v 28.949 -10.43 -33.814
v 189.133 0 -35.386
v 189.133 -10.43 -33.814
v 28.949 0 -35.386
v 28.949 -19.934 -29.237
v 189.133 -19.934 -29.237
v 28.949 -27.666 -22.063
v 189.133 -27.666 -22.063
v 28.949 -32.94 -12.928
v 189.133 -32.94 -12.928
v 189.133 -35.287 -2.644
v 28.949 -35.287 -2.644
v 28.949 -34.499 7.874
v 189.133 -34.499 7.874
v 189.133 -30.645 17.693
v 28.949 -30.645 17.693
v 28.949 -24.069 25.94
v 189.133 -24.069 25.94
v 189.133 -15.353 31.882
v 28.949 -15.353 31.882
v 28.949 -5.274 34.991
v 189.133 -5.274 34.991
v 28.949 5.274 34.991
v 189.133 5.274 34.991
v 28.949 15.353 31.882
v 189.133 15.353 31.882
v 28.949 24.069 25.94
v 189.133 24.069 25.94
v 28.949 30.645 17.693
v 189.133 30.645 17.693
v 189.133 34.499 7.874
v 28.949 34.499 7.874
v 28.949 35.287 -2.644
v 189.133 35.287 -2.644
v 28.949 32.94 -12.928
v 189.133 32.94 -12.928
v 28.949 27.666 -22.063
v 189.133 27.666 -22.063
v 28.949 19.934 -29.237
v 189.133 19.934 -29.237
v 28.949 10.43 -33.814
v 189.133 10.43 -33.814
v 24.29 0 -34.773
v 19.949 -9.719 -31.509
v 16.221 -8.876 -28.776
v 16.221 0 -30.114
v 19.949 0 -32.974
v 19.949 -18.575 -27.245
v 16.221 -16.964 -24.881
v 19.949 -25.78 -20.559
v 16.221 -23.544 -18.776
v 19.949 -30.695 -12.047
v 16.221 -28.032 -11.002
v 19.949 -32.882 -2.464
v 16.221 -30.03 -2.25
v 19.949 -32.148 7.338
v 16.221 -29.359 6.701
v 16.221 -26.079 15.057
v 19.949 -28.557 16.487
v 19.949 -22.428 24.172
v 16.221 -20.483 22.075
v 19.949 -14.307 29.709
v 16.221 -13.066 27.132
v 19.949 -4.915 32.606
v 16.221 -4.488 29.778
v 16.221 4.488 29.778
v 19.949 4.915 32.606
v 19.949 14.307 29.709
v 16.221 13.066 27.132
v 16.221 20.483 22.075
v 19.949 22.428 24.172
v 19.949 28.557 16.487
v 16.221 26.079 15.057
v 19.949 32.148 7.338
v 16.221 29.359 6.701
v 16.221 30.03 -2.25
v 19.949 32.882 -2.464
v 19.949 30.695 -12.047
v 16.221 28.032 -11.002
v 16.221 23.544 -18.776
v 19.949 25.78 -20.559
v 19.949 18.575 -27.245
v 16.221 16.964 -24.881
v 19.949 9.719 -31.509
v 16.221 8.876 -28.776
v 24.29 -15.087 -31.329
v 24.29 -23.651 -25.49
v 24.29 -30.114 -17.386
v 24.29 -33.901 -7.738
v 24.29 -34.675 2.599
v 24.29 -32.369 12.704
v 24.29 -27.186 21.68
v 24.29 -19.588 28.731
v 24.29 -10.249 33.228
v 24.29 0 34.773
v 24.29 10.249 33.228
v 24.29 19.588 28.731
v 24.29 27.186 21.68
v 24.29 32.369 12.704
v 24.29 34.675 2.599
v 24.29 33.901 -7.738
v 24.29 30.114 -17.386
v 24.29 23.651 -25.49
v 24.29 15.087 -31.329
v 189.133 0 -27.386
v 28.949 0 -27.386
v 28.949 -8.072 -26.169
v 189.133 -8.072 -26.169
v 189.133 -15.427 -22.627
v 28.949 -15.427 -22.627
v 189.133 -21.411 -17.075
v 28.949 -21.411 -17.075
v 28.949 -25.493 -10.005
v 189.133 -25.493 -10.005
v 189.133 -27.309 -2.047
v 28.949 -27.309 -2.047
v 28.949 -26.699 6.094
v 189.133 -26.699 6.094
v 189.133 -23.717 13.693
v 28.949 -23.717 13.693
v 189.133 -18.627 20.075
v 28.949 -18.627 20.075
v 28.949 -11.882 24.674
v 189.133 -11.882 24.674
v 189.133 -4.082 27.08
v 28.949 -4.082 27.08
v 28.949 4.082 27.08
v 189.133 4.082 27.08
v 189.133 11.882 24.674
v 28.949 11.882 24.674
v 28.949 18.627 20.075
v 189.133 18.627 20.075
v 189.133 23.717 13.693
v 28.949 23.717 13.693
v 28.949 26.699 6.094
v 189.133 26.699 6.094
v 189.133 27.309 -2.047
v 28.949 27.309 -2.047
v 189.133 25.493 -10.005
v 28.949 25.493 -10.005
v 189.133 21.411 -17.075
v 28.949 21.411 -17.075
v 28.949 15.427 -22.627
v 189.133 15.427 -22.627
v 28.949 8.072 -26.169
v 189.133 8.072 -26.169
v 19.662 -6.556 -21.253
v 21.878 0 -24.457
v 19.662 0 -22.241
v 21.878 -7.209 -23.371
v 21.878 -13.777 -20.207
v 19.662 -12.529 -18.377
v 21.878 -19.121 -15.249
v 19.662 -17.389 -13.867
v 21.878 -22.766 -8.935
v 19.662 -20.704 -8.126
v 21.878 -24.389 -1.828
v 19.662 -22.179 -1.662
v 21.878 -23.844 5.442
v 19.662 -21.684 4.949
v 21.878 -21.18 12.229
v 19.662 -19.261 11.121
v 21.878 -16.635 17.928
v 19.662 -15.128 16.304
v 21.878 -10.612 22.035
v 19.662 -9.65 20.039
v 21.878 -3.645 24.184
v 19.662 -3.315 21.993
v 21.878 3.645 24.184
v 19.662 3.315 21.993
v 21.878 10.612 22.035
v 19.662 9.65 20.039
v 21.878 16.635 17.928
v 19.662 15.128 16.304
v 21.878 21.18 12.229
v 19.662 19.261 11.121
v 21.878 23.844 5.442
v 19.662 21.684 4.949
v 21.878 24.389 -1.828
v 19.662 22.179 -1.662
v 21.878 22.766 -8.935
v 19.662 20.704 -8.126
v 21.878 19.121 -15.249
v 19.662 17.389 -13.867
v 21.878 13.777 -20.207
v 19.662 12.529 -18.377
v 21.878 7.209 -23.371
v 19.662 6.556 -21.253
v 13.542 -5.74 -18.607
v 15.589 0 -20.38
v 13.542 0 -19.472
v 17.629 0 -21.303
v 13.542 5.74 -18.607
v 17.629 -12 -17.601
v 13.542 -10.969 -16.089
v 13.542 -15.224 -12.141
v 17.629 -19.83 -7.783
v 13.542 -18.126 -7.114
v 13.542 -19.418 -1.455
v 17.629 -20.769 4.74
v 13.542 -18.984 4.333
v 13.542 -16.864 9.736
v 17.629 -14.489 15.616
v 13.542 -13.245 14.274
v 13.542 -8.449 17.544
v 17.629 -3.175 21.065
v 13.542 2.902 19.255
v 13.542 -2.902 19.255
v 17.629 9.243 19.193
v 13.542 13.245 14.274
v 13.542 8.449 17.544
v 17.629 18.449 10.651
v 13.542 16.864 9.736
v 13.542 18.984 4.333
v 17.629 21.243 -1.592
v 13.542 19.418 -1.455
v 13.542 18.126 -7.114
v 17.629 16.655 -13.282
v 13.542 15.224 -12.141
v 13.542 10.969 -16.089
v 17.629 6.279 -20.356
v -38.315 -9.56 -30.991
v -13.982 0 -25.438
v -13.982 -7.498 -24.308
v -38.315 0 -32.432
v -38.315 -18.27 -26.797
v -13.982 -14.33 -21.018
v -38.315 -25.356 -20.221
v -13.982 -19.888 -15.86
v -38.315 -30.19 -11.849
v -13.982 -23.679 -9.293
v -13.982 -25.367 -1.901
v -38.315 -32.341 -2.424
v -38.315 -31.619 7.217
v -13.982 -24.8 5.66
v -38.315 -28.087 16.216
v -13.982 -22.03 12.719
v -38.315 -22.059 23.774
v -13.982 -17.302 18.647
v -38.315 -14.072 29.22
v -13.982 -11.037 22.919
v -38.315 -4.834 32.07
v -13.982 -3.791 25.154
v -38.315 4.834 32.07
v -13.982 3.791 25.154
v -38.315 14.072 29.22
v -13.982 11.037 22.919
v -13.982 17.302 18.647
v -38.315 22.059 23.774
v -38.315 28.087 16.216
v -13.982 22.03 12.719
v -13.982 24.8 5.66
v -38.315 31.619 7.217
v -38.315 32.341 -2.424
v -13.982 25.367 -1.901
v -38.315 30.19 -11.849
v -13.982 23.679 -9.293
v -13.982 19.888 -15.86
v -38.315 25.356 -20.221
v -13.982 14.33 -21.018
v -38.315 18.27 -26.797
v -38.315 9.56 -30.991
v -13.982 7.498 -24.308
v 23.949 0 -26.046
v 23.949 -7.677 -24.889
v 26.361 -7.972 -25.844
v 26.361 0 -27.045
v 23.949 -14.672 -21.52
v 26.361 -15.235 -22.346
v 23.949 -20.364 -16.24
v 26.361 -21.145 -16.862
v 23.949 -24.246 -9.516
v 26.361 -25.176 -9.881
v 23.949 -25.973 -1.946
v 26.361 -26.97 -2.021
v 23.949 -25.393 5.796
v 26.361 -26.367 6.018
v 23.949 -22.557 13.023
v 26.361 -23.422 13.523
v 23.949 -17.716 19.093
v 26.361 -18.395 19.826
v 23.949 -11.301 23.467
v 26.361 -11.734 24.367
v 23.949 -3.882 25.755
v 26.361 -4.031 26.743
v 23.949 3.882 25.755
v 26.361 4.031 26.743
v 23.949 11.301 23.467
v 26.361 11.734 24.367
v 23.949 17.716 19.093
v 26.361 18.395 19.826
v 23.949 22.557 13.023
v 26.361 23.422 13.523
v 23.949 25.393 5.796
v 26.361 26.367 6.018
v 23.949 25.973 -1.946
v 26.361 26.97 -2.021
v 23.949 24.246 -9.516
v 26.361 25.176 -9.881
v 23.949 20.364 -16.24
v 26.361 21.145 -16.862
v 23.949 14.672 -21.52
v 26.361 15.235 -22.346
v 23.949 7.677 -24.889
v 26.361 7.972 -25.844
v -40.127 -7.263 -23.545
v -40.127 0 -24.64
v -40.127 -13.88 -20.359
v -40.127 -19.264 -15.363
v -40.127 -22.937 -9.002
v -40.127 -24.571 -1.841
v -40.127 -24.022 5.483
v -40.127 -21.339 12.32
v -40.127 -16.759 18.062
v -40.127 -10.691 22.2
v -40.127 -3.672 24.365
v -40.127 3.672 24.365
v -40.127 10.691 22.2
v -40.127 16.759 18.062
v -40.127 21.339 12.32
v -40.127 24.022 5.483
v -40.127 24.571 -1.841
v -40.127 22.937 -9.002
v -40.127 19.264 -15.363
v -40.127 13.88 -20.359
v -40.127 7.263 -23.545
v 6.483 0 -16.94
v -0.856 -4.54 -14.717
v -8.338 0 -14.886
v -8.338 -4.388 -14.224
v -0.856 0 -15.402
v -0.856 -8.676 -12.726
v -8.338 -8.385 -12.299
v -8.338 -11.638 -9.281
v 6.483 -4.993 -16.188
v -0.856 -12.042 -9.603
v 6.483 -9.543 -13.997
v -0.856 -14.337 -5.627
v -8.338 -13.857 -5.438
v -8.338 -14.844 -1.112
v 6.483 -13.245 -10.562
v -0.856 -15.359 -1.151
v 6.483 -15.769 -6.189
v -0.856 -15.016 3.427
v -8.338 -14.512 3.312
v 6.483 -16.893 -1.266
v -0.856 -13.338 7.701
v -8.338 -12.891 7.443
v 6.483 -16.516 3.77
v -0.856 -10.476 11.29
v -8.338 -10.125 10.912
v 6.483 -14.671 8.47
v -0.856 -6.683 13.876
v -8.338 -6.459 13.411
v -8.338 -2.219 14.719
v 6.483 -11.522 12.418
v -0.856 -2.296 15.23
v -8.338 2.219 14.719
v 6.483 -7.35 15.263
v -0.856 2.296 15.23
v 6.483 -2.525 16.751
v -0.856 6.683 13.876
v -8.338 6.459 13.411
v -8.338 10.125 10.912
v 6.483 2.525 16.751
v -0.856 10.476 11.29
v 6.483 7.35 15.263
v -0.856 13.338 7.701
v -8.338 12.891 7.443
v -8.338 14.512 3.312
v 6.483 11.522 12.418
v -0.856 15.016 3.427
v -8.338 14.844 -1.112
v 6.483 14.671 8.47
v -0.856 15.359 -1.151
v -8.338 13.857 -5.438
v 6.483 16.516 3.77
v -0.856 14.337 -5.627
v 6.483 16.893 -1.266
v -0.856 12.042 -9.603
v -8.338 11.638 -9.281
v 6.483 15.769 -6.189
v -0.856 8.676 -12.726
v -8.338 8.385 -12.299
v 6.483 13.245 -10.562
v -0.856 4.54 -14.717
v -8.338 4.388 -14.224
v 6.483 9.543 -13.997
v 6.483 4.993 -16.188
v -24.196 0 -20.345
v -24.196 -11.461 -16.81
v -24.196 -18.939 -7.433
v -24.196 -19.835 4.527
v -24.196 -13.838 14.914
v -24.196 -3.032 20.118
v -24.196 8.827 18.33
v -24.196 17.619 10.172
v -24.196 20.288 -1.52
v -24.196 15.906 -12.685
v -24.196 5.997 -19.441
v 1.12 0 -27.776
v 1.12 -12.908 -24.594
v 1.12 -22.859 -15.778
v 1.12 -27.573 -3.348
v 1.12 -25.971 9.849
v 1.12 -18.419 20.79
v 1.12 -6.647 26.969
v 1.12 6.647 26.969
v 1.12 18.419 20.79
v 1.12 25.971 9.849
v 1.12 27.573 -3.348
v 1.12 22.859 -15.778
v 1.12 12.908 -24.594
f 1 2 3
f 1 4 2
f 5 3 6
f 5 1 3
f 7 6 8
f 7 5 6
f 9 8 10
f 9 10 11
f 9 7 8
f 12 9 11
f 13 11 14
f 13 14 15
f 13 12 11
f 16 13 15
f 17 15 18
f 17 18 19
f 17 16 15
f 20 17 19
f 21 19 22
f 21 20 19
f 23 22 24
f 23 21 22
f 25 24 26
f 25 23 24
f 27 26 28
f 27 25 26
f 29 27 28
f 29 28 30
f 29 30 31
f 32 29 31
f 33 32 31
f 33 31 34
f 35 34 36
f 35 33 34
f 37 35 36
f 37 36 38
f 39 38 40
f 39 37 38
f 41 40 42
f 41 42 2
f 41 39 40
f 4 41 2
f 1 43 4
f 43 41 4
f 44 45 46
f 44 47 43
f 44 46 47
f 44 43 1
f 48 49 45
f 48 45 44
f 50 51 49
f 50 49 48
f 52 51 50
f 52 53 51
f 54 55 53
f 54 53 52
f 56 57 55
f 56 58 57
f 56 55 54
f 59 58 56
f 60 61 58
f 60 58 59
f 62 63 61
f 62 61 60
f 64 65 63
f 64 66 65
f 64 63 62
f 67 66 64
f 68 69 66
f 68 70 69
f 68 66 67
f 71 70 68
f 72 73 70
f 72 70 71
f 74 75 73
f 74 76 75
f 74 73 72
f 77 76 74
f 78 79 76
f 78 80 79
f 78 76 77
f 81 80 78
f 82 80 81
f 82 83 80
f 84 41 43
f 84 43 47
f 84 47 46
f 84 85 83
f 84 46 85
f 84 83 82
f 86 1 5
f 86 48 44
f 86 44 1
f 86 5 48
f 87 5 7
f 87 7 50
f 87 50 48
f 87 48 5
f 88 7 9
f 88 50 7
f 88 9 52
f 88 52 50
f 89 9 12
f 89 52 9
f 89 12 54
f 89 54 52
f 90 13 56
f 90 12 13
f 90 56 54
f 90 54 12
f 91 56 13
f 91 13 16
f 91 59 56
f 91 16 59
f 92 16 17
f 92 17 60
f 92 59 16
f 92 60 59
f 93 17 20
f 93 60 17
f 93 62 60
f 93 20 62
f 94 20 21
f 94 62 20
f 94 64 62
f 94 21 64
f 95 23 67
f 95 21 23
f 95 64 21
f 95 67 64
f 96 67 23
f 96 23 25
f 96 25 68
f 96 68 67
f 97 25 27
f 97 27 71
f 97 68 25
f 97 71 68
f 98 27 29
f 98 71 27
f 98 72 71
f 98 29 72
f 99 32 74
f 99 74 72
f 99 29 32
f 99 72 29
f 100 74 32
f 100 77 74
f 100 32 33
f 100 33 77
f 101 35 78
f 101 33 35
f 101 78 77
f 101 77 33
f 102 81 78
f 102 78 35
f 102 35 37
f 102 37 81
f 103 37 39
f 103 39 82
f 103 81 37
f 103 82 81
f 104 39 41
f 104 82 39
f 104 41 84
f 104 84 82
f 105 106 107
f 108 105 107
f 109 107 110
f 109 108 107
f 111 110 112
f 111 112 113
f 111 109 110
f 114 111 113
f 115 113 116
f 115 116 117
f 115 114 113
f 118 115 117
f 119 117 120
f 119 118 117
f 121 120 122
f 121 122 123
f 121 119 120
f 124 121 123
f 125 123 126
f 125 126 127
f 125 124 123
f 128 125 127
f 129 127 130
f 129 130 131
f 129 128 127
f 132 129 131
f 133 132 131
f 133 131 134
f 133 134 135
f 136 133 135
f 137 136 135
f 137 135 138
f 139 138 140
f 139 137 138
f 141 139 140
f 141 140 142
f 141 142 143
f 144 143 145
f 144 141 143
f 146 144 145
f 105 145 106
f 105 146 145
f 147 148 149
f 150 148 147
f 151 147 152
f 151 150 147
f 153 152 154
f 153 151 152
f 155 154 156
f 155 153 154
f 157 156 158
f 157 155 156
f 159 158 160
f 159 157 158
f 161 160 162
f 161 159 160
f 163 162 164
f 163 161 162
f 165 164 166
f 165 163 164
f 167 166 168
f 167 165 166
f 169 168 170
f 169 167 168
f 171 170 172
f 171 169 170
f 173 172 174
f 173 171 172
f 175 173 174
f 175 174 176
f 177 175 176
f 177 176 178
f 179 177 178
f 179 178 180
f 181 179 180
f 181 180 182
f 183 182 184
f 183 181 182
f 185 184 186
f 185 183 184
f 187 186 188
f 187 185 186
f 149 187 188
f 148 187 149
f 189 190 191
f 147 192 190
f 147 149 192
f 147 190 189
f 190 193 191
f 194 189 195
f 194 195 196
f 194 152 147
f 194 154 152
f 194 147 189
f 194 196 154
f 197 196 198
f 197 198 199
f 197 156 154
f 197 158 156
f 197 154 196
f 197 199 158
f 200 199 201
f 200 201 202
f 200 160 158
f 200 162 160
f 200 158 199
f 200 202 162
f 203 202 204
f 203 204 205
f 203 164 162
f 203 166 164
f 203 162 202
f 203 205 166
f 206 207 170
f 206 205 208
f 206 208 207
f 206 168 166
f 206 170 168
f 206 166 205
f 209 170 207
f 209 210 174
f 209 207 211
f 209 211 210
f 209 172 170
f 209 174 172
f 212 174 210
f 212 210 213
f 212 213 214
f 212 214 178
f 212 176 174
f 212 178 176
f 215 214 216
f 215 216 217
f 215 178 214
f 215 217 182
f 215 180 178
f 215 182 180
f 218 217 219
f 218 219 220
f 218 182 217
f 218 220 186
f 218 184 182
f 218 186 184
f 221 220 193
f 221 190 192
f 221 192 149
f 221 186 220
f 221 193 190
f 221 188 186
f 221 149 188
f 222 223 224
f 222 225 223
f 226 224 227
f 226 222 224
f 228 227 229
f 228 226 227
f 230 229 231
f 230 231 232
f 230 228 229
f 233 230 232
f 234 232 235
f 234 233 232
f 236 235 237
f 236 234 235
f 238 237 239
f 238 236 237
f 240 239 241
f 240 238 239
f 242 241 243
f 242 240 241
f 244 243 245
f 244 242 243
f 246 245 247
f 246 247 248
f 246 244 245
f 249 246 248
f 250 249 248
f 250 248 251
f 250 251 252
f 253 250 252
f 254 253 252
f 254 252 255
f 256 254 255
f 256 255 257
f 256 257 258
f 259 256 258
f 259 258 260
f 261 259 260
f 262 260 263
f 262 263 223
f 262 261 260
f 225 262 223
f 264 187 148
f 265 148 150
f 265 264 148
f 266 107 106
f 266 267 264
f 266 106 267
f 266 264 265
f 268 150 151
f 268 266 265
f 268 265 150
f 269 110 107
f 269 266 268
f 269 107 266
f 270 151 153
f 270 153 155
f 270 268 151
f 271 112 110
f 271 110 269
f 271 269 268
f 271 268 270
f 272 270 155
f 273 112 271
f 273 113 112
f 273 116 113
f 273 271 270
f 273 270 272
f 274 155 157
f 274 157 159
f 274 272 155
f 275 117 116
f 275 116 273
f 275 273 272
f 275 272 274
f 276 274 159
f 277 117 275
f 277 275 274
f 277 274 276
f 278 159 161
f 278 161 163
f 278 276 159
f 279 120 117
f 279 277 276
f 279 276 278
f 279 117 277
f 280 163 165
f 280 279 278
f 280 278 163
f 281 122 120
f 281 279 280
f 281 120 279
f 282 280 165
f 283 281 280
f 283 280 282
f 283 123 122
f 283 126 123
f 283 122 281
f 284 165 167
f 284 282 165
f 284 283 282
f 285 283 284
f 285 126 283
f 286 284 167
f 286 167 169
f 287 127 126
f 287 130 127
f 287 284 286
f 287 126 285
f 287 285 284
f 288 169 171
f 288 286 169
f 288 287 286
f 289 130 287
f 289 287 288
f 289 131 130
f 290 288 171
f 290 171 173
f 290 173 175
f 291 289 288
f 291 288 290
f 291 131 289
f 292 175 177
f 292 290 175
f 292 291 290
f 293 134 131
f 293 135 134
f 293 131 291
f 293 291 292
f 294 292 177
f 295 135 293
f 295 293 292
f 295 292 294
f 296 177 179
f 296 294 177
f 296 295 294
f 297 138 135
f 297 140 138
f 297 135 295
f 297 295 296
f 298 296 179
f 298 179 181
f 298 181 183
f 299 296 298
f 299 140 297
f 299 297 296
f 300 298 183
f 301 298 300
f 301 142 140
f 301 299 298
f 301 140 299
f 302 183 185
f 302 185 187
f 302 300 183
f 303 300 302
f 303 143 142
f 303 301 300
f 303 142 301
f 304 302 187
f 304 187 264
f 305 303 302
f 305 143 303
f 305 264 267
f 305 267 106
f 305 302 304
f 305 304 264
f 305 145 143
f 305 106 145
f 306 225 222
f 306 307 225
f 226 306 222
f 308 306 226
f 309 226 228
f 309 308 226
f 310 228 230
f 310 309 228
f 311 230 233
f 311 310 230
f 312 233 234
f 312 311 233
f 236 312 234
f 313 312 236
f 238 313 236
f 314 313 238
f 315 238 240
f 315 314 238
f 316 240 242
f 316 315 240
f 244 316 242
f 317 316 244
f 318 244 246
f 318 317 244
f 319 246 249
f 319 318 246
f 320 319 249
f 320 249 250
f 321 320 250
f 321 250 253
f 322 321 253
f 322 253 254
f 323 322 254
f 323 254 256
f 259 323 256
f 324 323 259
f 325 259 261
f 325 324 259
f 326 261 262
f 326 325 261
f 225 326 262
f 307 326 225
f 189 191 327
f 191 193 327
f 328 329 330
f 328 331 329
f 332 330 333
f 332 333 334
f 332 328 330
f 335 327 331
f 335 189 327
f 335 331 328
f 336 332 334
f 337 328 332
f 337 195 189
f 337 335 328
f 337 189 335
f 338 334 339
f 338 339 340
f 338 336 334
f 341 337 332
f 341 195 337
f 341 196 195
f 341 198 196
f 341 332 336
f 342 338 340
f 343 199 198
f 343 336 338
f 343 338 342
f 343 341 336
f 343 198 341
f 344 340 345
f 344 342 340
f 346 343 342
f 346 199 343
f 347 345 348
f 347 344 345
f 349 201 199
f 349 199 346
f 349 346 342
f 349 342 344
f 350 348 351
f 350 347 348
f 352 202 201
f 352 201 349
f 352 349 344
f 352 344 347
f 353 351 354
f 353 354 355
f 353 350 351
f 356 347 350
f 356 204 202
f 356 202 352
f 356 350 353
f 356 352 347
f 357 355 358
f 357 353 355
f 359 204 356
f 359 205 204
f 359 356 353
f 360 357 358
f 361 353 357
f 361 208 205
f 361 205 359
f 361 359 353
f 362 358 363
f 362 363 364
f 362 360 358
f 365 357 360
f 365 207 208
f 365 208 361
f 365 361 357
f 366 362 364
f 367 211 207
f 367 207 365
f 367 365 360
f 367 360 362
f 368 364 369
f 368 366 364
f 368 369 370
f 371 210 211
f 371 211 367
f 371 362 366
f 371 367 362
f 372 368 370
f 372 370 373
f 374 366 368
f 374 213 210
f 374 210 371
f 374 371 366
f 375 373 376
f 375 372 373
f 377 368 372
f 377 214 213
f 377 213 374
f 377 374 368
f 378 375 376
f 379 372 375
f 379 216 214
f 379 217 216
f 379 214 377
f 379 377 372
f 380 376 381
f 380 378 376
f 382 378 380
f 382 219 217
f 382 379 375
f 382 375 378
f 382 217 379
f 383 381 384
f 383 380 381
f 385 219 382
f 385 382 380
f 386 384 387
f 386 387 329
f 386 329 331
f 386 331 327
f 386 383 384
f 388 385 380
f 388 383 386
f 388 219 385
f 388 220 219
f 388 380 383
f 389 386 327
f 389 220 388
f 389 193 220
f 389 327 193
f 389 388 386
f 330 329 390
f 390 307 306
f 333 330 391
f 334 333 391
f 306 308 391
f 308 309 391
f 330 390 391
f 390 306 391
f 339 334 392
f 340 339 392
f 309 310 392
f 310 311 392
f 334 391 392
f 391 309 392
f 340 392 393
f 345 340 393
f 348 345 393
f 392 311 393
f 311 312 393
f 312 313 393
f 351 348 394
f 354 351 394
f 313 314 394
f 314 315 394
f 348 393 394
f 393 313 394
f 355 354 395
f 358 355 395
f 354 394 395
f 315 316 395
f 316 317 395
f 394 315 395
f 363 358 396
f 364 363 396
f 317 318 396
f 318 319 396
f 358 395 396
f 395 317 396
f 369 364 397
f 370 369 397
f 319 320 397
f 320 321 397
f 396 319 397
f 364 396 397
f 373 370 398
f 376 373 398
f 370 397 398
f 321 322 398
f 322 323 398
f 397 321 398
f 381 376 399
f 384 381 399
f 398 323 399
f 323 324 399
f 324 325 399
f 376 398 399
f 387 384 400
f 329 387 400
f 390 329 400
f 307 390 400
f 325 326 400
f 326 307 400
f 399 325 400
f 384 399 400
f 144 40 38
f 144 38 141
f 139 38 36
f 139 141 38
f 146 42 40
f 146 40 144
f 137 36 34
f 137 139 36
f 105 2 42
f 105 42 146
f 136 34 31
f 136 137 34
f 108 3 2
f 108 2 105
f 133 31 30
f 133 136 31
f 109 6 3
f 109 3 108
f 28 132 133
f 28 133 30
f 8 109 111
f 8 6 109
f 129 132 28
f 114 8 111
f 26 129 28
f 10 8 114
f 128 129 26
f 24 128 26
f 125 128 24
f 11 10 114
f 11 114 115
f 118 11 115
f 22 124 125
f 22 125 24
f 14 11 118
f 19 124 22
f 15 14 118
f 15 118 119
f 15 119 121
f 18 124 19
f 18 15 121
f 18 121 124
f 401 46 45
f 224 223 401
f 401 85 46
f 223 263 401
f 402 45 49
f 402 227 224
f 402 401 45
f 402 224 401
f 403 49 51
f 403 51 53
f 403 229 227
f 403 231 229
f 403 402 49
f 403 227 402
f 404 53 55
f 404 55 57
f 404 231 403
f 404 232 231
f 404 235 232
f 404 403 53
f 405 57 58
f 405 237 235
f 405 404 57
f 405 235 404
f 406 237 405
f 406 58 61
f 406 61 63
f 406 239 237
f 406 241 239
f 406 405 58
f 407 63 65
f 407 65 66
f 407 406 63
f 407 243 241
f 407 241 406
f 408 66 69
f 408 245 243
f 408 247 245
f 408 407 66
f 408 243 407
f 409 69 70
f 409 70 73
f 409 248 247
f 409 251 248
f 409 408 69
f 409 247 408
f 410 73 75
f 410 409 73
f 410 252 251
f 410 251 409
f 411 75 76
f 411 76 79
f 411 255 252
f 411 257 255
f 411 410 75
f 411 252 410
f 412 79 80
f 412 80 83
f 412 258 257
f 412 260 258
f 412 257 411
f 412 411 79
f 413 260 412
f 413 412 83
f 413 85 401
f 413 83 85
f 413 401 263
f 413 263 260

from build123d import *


with BuildPart() as part:
    # Sketch1 → Revolve1 (revolve)
    with BuildSketch(Plane.XY, mode=Mode.PRIVATE) as revolve1_sk:
        with BuildLine():
            Line((28.949236933, 27.386004017), (189.133015331, 27.386004017))
            Line((189.133015331, 27.386004017), (189.133015331, 35.386004017))
            Line((189.133015331, 35.386004017), (28.949236933, 35.386004017))
            ThreePointArc((28.949236933, 35.386004017), (22.060935151, 34.015835602), (16.221314872, 30.113926078))
            Line((16.221314872, 30.113926078), (7.884849119, 21.777460326))
            ThreePointArc((7.884849119, 21.777460326), (5.344435892, 20.007381854), (2.348184674, 19.226769399))
            add(Edge.make_bspline(
                [(2.348184674, 19.226769399), (0.313545637, 20.077506038), (-5.800272608, 22.518234312), (-11.933859147, 24.735791909), (-13.981586932, 25.43765231)],
                knots=[0.018493807, 0.018493807, 0.018493807, 0.117487589, 0.315475154, 0.414468937, 0.414468937, 0.414468937], degree=2))
            add(Edge.make_bspline(
                [(-13.981586932, 25.43765231), (-16.029314717, 26.139512711), (-28.160190771, 30.070121673), (-38.315022829, 32.432092239)],
                knots=[0.414468937, 0.414468937, 0.414468937, 0.513462719, 1, 1, 1], degree=2))
            Line((-38.315022829, 32.432092239), (-40.127010283, 24.64))
            add(Edge.make_bspline(
                [(-8.337690555, 14.885570905), (-24.160193055, 20.927046968), (-40.127010283, 24.64)],
                knots=[0.208731219, 0.208731219, 0.208731219, 1, 1, 1], degree=2))
            ThreePointArc((-8.337690555, 14.885570905), (2.839826237, 16.044626201), (13.541703369, 19.472470519))
            ThreePointArc((13.541703369, 19.472470519), (16.609976492, 20.839222591), (19.662309445, 22.241212152))
            Line((19.662309445, 22.241212152), (21.878169121, 24.457071829))
            ThreePointArc((21.878169121, 24.457071829), (25.12240261, 26.624799342), (28.949236933, 27.386004017))
        make_face()
        with BuildLine():
            Line((7.884849119, 21.777460326), (16.221314872, 30.113926078))
            Line((16.221314872, 30.113926078), (-13.981586932, 25.43765231))
            add(Edge.make_bspline(
                [(2.348184674, 19.226769399), (0.313545637, 20.077506038), (-5.800272608, 22.518234312), (-11.933859147, 24.735791909), (-13.981586932, 25.43765231)],
                knots=[0.018493807, 0.018493807, 0.018493807, 0.117487589, 0.315475154, 0.414468937, 0.414468937, 0.414468937], degree=2))
            ThreePointArc((2.348184674, 19.226769399), (5.344435892, 20.007381854), (7.884849119, 21.777460326))
        make_face()
    revolve(revolve1_sk.sketch.rotate(Axis((0, 0, 0), (-1, 0, 0)), 90), axis=Axis((0, 0, 0), (-1, 0, 0)))


solid = part.part
